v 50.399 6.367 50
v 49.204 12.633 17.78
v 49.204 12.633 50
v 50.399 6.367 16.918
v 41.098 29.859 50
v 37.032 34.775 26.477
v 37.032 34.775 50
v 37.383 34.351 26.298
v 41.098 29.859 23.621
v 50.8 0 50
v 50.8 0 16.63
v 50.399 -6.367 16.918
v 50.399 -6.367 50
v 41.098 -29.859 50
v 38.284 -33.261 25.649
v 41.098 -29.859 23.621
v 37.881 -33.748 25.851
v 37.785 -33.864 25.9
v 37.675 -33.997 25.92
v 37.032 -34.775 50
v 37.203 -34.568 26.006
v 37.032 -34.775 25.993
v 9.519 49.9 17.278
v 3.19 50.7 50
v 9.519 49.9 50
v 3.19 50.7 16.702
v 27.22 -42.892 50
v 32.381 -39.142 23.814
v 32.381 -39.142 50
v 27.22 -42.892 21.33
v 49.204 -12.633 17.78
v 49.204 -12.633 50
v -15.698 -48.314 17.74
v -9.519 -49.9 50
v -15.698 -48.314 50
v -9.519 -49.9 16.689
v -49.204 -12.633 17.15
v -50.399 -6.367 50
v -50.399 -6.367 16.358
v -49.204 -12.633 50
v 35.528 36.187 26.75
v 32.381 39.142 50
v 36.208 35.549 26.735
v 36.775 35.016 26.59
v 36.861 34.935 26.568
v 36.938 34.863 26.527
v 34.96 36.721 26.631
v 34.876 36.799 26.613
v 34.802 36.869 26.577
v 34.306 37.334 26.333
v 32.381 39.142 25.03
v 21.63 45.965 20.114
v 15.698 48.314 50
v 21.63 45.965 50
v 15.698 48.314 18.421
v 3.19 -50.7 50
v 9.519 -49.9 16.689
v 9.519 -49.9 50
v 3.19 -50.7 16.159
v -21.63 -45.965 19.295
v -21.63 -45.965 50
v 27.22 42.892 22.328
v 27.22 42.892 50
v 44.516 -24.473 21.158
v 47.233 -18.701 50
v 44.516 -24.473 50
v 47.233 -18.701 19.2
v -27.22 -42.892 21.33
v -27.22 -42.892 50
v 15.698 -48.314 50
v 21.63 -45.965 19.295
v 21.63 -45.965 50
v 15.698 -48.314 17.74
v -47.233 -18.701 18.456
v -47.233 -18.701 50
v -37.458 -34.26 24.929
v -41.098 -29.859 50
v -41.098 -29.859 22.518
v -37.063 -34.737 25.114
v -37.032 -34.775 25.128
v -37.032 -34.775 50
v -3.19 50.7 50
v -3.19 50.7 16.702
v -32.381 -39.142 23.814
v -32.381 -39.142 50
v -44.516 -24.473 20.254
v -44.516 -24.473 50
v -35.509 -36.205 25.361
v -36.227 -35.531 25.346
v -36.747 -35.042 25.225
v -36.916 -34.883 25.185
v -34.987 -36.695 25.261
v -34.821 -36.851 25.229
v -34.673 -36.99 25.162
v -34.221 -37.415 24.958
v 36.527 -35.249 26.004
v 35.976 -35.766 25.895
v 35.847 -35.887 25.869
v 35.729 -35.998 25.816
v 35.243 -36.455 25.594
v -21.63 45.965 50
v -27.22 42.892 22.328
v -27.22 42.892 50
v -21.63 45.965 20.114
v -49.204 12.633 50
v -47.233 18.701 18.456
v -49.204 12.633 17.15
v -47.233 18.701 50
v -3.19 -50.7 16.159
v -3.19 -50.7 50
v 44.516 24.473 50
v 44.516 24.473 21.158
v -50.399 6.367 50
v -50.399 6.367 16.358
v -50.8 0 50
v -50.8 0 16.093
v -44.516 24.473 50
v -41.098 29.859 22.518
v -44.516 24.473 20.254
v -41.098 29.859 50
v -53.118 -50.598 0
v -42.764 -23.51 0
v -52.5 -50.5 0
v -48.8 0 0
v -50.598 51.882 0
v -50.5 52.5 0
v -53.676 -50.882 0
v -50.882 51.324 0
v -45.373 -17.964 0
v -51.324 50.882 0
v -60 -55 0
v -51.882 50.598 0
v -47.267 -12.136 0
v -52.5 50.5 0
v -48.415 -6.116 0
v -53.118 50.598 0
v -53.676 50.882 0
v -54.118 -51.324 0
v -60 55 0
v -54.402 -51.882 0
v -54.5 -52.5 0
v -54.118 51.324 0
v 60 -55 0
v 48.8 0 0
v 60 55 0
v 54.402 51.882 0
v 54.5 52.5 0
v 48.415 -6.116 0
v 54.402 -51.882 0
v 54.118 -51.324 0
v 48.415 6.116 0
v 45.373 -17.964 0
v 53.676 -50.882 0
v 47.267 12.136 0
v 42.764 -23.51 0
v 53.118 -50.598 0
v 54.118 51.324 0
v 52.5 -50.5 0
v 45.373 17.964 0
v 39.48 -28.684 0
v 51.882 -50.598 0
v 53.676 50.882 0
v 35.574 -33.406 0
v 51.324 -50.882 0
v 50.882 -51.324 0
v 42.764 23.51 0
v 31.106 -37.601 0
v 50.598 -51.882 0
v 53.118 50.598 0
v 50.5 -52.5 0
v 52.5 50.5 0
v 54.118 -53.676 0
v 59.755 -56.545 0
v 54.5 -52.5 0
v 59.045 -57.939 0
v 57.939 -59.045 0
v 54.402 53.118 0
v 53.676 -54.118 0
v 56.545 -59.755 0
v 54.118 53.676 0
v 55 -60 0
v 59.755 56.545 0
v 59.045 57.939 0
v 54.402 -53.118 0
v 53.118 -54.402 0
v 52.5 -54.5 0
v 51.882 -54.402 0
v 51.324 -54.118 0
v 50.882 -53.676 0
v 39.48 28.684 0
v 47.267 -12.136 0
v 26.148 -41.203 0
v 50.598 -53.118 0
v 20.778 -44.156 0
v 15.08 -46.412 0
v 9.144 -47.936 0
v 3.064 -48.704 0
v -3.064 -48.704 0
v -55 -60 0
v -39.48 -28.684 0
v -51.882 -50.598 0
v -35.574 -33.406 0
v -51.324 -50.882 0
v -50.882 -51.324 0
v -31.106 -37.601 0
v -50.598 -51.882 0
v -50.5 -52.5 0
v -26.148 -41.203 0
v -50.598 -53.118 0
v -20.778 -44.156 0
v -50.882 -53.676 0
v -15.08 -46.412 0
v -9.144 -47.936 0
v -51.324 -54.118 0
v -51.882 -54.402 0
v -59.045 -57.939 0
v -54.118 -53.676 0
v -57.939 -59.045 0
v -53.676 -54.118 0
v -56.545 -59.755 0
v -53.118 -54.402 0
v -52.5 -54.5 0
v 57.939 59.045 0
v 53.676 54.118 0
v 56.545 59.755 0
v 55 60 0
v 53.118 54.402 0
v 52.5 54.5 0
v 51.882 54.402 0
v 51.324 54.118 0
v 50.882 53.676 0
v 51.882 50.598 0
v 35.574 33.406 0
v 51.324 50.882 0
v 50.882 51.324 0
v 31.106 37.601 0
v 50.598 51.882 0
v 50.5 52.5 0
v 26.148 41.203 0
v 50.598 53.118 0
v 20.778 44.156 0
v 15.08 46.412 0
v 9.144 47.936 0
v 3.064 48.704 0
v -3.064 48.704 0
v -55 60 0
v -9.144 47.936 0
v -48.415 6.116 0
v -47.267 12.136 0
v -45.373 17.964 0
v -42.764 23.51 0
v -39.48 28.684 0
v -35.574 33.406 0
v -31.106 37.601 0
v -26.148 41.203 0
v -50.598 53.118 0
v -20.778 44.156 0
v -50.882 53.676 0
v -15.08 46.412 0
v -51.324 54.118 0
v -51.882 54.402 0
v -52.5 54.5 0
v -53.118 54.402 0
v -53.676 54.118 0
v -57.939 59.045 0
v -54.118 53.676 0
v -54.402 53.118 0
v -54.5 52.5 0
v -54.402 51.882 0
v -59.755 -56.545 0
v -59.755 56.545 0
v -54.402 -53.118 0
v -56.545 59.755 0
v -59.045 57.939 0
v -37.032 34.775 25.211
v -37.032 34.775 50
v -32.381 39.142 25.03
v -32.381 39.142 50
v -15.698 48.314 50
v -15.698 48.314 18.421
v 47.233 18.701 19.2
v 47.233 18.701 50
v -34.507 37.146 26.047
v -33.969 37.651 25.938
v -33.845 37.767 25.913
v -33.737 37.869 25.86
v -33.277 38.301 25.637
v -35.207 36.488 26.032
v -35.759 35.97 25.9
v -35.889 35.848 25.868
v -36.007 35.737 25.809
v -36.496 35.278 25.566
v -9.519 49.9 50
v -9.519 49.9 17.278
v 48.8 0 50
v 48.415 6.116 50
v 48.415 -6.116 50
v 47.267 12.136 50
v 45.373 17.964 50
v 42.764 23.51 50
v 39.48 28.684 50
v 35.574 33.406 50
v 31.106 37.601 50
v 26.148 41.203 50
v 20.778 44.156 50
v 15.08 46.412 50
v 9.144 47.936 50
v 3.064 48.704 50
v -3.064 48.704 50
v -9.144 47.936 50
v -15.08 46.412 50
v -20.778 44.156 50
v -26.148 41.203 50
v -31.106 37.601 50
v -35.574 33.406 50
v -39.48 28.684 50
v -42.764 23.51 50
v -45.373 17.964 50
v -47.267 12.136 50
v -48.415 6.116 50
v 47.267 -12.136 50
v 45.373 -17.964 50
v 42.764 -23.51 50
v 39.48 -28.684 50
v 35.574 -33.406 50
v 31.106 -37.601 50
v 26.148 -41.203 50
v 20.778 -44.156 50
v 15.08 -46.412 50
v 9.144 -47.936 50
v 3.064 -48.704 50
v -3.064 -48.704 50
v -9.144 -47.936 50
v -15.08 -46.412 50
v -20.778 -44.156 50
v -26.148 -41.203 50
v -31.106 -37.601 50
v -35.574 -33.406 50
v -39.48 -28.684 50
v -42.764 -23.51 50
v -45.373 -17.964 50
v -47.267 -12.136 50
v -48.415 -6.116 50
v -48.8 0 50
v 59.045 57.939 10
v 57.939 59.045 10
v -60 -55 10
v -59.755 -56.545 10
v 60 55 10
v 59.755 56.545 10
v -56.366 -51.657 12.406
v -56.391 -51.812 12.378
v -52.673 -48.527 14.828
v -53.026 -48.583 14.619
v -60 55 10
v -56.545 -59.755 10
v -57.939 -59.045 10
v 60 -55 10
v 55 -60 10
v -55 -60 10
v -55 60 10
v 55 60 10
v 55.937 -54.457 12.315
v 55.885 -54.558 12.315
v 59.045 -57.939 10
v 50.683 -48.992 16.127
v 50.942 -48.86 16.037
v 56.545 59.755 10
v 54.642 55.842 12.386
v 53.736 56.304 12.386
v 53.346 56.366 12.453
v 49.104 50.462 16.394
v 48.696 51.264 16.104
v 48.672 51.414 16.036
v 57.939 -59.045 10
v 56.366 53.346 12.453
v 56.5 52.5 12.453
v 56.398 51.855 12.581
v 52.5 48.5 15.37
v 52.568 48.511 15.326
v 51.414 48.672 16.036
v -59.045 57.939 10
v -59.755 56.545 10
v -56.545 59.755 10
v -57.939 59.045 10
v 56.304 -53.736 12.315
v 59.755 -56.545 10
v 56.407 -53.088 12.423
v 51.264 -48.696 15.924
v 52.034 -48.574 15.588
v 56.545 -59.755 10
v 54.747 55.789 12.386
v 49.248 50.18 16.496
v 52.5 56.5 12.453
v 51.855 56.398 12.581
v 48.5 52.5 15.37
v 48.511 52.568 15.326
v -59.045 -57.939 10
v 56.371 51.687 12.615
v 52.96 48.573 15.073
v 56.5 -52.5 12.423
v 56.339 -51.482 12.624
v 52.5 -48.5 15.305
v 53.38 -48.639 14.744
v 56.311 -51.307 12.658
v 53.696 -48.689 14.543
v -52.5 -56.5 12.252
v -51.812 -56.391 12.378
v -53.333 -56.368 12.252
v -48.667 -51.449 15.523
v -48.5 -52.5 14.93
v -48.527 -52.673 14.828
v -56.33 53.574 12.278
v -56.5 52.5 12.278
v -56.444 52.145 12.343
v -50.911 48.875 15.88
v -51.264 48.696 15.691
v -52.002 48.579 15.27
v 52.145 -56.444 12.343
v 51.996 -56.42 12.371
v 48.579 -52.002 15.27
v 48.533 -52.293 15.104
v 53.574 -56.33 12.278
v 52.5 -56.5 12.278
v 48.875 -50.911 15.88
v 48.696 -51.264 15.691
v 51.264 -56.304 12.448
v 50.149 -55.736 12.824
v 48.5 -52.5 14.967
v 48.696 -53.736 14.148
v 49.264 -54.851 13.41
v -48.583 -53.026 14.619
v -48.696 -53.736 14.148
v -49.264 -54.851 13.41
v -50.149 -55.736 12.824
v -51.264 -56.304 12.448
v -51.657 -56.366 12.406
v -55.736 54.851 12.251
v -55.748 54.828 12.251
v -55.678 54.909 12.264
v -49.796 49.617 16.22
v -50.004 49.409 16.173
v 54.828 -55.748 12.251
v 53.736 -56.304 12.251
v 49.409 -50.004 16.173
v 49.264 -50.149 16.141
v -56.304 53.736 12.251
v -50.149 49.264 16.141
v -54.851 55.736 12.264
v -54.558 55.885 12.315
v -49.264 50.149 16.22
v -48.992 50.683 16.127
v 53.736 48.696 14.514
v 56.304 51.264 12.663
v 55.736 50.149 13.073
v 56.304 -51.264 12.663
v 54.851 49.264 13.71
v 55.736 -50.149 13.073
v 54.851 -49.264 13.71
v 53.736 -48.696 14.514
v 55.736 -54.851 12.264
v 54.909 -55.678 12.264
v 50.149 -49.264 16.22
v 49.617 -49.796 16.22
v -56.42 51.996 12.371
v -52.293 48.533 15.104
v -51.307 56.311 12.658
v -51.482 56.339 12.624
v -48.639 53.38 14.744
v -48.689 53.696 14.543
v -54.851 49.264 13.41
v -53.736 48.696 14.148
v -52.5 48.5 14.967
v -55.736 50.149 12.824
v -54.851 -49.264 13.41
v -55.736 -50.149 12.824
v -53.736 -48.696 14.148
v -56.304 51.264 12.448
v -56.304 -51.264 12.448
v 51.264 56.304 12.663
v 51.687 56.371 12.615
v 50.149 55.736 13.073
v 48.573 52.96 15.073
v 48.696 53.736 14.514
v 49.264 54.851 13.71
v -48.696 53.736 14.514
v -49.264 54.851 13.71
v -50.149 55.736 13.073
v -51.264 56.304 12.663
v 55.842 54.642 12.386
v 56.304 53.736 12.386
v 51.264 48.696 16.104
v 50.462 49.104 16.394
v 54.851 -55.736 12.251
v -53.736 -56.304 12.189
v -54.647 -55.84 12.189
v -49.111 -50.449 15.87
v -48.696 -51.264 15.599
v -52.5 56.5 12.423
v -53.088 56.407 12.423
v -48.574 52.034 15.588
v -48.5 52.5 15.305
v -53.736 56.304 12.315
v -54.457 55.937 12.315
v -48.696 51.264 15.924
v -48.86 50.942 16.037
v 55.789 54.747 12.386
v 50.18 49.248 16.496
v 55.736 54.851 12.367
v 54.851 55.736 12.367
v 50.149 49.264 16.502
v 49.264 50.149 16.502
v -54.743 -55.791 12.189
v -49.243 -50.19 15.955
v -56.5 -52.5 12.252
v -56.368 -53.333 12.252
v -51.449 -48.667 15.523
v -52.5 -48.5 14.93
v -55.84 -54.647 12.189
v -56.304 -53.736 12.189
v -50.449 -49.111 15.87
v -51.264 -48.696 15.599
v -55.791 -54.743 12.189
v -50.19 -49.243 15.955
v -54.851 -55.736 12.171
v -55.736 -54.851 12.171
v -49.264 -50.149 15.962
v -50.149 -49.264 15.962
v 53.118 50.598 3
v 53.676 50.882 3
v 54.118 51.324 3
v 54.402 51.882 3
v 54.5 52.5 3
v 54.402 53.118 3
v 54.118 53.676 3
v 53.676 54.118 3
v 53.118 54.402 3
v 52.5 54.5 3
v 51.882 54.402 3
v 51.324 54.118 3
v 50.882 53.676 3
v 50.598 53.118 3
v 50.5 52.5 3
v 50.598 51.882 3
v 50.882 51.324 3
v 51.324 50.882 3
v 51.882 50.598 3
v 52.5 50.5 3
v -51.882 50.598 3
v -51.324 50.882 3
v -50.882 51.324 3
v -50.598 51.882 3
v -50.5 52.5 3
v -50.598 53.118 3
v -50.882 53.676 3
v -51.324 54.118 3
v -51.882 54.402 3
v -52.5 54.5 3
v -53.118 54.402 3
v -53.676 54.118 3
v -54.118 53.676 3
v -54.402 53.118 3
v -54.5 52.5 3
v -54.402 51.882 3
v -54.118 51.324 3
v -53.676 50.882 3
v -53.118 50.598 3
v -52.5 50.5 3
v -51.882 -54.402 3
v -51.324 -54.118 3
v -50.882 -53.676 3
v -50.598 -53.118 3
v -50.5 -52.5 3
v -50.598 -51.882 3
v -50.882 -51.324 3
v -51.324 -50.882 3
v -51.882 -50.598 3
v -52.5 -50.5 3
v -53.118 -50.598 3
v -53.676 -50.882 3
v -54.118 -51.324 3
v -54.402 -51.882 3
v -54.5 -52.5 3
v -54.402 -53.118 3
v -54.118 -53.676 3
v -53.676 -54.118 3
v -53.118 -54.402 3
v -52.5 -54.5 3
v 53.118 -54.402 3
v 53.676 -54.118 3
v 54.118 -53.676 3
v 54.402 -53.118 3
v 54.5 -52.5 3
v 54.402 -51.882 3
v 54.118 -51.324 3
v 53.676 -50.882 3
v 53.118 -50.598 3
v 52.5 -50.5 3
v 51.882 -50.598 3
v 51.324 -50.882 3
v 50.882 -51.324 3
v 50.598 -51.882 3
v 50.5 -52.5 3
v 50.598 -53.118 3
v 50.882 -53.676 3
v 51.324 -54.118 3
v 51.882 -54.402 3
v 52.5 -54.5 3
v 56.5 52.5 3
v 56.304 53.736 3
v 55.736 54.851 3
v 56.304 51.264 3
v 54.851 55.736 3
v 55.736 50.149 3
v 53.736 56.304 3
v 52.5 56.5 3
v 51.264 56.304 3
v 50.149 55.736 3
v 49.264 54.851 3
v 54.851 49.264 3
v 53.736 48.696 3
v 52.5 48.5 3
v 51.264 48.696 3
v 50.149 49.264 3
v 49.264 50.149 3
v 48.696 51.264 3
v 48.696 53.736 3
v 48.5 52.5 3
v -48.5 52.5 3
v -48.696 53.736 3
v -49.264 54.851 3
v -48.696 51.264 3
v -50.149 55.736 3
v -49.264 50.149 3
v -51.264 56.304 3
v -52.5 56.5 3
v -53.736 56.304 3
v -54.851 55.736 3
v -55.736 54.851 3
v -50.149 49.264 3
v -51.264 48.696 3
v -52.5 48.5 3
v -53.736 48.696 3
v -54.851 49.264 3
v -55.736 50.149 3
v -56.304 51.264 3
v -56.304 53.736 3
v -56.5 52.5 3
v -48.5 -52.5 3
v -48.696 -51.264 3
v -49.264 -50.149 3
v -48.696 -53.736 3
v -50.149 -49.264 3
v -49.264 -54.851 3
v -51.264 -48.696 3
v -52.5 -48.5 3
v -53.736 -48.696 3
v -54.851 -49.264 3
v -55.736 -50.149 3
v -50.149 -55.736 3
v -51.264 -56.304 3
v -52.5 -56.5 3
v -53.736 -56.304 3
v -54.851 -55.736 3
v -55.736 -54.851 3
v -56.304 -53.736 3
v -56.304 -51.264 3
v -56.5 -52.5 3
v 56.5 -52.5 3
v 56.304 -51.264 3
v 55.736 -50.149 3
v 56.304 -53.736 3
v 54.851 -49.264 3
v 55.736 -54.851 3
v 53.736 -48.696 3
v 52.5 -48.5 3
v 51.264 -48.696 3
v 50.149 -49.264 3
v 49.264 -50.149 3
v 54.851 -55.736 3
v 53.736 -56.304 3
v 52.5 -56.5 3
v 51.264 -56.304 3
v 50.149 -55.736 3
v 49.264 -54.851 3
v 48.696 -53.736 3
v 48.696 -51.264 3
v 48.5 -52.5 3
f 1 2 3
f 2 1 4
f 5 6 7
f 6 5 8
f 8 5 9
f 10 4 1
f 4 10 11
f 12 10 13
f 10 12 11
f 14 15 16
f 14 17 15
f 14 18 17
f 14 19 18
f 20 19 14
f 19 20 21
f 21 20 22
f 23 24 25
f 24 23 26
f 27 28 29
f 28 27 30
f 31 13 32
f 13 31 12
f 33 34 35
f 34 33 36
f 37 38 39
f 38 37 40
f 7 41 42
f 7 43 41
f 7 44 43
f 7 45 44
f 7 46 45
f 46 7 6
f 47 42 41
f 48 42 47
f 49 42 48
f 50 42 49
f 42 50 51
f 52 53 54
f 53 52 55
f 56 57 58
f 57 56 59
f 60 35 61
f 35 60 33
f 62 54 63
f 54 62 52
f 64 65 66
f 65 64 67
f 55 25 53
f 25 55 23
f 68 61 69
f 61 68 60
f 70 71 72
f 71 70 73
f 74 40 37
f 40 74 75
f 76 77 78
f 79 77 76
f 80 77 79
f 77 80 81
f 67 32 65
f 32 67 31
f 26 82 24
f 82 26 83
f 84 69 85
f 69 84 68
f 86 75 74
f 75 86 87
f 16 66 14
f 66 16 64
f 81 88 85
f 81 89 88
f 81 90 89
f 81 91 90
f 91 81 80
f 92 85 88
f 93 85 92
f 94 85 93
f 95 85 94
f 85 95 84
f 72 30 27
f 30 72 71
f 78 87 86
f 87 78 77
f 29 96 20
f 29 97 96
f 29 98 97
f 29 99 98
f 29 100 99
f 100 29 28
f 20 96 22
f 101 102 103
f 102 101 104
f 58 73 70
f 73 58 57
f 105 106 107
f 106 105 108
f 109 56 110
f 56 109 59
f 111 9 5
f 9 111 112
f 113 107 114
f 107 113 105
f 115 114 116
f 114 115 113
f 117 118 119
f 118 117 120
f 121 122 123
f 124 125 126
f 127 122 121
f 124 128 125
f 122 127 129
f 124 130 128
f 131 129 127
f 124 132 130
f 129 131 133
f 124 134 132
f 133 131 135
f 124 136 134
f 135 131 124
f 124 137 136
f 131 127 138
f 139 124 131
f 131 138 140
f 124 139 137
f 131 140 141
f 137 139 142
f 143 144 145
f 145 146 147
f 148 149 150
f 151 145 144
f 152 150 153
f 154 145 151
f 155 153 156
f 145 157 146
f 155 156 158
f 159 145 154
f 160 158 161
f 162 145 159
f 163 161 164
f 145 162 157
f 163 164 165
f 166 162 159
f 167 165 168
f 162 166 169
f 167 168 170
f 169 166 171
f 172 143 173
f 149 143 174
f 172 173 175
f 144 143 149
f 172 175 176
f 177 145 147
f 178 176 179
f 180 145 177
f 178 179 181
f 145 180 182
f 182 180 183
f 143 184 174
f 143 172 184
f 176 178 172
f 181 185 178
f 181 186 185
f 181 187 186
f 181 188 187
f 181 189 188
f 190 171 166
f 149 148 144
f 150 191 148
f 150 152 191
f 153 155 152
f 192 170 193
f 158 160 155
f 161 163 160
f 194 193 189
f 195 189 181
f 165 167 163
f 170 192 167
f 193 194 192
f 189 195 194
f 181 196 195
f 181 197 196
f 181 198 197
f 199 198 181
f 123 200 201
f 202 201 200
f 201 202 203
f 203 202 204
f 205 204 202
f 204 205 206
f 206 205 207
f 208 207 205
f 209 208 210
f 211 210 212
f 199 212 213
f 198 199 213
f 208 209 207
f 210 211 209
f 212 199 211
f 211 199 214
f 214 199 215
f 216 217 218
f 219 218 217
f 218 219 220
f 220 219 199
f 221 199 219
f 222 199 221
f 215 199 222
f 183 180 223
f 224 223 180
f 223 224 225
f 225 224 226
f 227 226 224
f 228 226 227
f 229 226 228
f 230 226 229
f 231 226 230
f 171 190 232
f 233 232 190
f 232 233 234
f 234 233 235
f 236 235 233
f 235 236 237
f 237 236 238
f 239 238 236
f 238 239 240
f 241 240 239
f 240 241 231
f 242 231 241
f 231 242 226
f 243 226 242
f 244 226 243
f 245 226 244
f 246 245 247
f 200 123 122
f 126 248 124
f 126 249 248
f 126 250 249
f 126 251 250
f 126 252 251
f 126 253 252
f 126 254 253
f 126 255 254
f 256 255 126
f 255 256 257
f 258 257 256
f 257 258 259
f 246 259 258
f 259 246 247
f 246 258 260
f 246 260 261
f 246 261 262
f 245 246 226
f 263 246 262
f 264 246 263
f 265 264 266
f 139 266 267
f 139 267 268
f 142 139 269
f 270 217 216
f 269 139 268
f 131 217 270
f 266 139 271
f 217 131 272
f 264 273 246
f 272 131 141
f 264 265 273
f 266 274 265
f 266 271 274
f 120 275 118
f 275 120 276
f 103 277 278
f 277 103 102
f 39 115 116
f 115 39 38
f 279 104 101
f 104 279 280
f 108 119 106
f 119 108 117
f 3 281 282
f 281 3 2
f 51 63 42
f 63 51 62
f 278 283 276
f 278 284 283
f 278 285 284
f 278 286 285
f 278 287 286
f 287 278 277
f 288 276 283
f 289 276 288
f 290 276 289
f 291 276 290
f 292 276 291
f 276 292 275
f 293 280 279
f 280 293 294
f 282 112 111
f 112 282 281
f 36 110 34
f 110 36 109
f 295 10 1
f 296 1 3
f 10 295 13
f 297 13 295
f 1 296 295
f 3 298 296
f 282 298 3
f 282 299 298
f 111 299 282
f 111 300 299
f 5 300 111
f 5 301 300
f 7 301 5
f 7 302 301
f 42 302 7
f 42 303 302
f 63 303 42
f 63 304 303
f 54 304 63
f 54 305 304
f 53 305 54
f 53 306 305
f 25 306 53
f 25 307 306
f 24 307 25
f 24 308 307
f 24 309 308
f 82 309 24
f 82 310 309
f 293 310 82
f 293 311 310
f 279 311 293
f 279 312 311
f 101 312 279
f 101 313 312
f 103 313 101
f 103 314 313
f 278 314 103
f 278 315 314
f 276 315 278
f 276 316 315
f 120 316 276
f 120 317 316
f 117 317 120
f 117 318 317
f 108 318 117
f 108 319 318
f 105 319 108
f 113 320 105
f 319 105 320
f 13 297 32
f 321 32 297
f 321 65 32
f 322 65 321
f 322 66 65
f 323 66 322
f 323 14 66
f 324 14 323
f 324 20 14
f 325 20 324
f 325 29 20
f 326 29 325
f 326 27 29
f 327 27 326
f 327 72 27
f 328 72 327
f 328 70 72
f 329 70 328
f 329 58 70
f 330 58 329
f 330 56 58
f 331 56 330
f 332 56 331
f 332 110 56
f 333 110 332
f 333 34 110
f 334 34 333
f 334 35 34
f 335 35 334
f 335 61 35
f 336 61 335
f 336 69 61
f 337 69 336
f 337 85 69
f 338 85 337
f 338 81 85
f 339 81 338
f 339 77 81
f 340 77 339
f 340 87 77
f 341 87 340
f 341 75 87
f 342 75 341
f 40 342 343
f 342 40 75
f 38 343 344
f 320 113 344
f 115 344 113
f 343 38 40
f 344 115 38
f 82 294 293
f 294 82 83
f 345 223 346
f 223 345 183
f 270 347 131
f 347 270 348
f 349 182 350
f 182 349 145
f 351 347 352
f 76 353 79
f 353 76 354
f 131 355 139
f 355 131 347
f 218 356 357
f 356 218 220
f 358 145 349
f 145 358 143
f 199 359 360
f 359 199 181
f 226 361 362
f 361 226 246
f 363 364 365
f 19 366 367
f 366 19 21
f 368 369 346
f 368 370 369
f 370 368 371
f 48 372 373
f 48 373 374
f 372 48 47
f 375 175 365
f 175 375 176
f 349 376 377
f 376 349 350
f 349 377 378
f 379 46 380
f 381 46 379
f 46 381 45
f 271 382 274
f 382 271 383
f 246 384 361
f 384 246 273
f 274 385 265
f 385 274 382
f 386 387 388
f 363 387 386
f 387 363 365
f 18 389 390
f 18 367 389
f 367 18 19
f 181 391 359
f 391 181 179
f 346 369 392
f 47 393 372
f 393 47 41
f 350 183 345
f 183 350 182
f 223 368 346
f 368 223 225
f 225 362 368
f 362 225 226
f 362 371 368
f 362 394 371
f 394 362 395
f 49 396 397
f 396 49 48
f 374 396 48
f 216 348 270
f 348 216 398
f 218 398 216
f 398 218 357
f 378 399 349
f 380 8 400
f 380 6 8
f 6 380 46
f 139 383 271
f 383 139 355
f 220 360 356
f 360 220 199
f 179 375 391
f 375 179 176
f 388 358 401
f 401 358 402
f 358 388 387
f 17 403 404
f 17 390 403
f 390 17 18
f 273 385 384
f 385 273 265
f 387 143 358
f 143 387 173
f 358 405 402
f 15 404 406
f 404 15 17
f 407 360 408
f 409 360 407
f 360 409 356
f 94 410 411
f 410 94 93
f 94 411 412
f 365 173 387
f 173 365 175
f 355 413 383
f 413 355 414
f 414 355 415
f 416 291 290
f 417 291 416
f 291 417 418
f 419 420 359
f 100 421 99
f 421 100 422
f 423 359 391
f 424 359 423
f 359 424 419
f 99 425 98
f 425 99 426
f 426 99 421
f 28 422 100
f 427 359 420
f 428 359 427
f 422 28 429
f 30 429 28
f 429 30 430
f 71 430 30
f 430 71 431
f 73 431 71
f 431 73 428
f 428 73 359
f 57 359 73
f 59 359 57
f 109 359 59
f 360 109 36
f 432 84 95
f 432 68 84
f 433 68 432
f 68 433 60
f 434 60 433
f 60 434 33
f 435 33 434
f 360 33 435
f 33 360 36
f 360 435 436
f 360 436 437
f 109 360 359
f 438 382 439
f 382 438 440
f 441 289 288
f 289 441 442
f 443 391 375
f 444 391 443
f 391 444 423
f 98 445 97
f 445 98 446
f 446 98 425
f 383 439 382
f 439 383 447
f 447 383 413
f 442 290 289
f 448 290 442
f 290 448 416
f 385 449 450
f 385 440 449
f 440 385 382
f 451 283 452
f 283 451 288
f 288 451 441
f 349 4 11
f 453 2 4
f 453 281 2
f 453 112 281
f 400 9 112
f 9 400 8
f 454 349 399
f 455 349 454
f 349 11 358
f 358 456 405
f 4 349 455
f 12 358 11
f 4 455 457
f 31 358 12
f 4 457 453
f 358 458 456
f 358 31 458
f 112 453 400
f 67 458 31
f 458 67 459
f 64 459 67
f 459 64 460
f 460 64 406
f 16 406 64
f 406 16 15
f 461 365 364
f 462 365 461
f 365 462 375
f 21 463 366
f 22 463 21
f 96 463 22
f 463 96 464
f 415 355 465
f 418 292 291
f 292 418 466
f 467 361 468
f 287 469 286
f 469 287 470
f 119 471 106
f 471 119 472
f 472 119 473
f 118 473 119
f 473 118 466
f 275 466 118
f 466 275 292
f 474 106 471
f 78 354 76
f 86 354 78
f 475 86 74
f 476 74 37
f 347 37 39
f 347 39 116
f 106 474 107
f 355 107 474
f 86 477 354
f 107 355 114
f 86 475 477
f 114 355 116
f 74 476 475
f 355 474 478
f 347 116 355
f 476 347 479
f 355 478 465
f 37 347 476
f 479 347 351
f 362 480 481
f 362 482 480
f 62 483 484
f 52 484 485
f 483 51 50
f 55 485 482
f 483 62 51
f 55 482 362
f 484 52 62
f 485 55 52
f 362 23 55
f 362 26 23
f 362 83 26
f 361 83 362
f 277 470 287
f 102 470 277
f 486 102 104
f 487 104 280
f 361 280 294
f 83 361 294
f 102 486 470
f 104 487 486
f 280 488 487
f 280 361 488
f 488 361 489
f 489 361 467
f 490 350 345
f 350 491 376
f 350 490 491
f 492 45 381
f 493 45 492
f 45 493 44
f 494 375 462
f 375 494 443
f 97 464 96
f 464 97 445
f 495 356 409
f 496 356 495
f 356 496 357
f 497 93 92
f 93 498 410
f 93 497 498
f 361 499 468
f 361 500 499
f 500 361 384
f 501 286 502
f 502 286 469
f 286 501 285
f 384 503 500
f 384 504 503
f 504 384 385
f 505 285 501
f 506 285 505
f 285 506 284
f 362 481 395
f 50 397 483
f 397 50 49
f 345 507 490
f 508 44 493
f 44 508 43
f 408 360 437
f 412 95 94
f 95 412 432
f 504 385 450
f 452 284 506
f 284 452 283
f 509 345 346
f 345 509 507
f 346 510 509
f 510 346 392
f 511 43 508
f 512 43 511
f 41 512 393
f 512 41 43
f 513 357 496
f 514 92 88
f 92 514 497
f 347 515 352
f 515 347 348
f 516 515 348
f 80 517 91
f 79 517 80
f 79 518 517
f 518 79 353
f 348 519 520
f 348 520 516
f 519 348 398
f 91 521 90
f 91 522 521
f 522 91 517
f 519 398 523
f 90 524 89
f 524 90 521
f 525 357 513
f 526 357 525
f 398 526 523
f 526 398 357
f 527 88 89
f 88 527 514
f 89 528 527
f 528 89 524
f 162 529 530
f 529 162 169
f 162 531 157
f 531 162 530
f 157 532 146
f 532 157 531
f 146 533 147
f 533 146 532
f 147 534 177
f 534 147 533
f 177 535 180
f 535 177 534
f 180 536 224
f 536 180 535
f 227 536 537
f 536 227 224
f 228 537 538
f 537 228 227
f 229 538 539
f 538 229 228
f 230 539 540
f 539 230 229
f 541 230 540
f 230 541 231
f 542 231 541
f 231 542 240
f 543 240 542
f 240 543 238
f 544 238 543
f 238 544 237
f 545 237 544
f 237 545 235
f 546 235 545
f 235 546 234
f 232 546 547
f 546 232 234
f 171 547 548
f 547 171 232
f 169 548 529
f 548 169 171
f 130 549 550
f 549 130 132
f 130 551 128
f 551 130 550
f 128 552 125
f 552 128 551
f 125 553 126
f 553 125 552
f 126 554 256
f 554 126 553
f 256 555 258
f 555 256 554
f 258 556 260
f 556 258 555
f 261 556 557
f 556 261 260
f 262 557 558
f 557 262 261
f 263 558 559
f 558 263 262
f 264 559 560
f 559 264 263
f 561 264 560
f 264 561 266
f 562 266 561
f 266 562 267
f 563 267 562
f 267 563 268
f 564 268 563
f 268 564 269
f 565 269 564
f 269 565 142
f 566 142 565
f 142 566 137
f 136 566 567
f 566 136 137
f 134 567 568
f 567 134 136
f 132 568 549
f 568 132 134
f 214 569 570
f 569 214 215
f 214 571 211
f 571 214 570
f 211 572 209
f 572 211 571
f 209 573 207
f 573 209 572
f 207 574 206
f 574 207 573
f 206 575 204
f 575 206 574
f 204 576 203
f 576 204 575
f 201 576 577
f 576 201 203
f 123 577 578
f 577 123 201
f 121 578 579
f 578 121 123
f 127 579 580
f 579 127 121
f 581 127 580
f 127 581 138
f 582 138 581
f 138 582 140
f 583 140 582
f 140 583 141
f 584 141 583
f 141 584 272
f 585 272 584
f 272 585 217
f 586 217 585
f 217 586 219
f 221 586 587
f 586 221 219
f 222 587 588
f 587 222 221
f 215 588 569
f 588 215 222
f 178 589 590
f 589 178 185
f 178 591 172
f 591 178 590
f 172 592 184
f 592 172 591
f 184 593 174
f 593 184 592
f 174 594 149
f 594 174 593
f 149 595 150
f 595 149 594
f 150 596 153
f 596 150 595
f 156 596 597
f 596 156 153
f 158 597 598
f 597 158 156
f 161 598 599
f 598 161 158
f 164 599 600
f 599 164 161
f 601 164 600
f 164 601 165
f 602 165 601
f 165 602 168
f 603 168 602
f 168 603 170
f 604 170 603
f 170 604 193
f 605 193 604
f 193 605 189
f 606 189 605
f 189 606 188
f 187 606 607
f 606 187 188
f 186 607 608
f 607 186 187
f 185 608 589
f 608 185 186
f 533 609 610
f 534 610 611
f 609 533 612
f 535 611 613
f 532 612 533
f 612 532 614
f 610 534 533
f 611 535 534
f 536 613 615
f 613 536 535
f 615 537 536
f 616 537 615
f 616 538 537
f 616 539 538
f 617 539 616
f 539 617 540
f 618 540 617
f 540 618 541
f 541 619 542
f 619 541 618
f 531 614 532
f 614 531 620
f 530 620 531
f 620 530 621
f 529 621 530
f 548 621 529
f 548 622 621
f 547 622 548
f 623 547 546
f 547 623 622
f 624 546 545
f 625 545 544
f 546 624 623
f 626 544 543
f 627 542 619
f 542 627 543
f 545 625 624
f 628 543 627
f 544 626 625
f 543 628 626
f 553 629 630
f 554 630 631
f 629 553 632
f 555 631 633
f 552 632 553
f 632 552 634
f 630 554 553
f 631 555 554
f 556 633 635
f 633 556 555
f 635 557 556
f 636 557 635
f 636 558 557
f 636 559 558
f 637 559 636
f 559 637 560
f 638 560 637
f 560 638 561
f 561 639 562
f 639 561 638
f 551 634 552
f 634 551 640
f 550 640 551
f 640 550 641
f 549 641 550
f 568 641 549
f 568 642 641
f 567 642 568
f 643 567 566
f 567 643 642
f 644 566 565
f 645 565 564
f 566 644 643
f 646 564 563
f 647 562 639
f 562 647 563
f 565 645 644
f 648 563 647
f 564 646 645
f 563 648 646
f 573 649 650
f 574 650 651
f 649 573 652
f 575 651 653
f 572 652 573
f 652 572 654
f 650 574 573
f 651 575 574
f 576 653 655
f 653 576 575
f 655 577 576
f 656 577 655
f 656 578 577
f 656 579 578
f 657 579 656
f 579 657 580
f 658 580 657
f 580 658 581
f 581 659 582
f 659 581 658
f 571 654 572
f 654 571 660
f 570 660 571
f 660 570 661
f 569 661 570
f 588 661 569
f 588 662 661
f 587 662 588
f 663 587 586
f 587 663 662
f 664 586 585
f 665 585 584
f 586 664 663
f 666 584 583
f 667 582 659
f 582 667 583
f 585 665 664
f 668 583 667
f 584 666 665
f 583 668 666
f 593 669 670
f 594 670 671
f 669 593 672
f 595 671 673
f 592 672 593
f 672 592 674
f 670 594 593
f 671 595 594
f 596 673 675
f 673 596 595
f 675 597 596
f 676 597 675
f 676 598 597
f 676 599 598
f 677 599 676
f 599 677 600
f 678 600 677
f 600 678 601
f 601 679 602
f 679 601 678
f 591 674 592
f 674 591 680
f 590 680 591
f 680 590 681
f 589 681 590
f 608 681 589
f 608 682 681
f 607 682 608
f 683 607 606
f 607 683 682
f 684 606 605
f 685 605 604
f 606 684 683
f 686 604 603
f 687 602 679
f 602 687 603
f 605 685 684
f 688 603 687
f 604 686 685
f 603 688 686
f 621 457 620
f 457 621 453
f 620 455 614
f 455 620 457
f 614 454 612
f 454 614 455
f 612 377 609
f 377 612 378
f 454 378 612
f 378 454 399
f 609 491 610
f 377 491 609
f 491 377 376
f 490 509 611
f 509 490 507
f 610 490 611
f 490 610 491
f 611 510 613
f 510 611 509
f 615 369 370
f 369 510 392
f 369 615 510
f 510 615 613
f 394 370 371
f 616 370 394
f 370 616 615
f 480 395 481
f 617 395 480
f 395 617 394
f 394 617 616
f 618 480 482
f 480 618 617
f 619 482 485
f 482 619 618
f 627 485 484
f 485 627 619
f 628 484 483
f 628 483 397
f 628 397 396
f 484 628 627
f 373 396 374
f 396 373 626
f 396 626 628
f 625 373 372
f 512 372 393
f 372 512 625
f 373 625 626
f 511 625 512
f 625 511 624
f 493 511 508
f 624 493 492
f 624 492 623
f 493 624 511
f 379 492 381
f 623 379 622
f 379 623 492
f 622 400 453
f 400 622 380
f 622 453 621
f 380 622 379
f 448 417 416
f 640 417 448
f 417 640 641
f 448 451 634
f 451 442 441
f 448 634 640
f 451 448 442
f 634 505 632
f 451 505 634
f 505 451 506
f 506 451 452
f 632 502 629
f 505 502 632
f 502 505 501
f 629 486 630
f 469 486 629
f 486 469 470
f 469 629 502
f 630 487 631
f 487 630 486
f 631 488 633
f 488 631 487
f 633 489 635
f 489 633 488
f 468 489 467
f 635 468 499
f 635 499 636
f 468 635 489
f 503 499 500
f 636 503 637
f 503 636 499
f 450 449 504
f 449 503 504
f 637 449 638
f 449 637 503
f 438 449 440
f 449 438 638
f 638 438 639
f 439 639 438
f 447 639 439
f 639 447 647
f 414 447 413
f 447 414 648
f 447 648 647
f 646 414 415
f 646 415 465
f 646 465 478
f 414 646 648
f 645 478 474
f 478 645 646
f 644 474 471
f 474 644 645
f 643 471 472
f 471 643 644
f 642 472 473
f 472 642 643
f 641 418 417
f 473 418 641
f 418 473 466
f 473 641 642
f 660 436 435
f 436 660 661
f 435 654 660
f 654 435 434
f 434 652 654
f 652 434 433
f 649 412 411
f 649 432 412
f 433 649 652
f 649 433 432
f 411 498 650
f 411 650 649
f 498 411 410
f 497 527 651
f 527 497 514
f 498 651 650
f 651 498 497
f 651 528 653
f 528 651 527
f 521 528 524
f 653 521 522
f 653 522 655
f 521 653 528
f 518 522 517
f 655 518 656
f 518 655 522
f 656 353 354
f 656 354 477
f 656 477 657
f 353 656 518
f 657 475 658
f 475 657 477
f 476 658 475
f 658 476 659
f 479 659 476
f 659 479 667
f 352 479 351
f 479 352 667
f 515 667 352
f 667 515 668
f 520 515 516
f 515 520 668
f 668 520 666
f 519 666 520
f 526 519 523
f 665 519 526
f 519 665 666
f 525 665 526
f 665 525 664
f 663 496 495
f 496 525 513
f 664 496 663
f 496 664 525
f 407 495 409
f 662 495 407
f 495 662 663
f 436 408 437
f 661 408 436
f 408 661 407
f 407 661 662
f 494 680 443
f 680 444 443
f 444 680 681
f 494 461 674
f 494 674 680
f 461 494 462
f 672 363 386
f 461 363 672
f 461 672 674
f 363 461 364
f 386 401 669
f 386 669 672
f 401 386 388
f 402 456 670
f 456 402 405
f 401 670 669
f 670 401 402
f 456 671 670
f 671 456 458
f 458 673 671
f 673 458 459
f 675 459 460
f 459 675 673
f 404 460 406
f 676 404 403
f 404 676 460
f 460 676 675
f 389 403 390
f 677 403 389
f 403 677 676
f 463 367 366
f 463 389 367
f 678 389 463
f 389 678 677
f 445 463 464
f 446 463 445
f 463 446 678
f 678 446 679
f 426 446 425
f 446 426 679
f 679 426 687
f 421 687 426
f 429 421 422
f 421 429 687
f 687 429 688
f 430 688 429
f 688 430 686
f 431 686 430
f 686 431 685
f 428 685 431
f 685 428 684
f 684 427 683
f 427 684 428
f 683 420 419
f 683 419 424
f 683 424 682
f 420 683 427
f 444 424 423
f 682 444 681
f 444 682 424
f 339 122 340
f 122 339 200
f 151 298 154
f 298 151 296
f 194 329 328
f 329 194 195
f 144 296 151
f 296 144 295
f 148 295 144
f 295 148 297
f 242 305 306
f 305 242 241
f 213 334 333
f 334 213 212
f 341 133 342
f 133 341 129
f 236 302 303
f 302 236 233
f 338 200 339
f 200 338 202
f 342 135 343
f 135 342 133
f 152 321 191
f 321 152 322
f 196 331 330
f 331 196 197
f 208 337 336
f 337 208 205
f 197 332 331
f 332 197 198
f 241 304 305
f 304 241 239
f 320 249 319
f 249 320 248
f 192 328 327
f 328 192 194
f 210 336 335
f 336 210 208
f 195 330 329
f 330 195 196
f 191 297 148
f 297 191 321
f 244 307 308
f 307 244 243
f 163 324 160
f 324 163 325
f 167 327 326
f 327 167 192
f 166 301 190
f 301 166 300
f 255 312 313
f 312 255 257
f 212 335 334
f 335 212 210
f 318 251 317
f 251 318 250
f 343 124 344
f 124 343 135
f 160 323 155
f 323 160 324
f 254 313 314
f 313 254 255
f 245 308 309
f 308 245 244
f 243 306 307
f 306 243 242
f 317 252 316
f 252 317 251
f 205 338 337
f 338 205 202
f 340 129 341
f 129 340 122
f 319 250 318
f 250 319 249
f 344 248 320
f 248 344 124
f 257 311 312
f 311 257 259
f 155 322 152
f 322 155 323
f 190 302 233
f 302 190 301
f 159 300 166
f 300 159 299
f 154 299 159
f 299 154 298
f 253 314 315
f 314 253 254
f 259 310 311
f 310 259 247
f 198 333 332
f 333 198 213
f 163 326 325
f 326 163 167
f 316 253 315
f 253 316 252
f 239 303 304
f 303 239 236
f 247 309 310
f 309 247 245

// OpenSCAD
// file: ../lib/utils.scad
include <params.scad>;

function tol(val) = val - tolerance;

module cone(r, angle, invert=false) {
    h = tan((180 - angle) / 2) * r;
    translate([0, 0, -h]) {
        if (invert) {
                cylinder(r1=r,r2=0,h=h, $fn=20); 
        } else {
            cylinder(r1=0,r2=r,h=h, $fn=20); 
        }
    }
}

module roundrect(vect, r, $fn=20) {
    sq = len(vect) > 1
        ? [for (i = [0:1:len(vect)-1]) vect[i] - r * 2]
        : vect - r * 2;
    minkowski() {
        square(sq);
        translate([r, r])
            circle(r=r);
    }
}

module profile($fn=20) {
    minkowski() {
        translate([fan_case_radius, fan_case_radius, 0])
            square(fan_case - fan_case_radius * 2);
        circle(fan_case_radius, $fn);
    }
}

module fan_mount_points(radius, $fn=20) {
    offset = (fan_case - fan_screw_distance) / 2;
    translate([offset, offset, 0]) {
        circle(radius, $fn);
        translate([fan_screw_distance, 0, 0])
            circle(radius, $fn);
        translate([fan_screw_distance, fan_screw_distance, 0])
            circle(radius, $fn);
        translate([0, fan_screw_distance, 0])
            circle(radius, $fn);
    }
}

module square_grill(width, height, fin_width, fin_count) {
    fin_spacing = width / fin_count;
    difference() {
        square(width);
        union() {
            for (i = [0:1:fin_count]) {
                translate([(i + 1) * fin_spacing - (fin_spacing / 2) - (fin_width / 2), 0, 0])
                    square([fin_width, height]);
            }
        }
    }
}

module bushing(outer_r, inner_r, h) {
    linear_extrude(h)
        difference() {
            circle(r=outer_r);
            circle(r=inner_r);
        }
}

module screw_at_origin(r, d, l, head, head_d, cap, angle) {
    translate([0, 0, -l])
        screw(r, d, l, head, head_d, cap, angle);
}

module screw(r, d, l, head, head_d, cap, angle, fn=20, head_fn) {
    radius = r > 0 ? r : d / 2;
    head_r = head > 0 ? head : head_d / 2;
    hfn = head_fn ? head_fn : fn;

    union() {
        if (angle) {
            translate([0, 0, l])
                cone(head_r, angle, false);
        }
        linear_extrude(l)
            circle(r=radius, $fn=fn);
        if (cap > 0) {
            translate([0, 0, l - cap])
                linear_extrude(cap)
                    circle(r=head_r, $fn=hfn);
        }
    }
}

module inset_screw(r, d, l, head, head_d, cap, angle, inset, fn=20, head_fn) {
    screw_height = l - inset;
    head_r = head > 0 ? head : head_d / 2;

    union() {
        screw(
            r=r,
            d=d,
            l=screw_height,
            head=head_r,
            cap=cap,
            angle=angle,
            fn=fn,
            head_fn=head_fn
        );
        translate([0, 0, screw_height])
            linear_extrude(inset)
                circle(r=head_r, $fn=fn);
    }
}

function inch_to_mm(inches) = inches * 25.4;
// file: ../lib/params.scad
fan_case = 120;
fan_screw_distance = 105;
fan_case_depth = 25;
fan_case_radius = 5;
fan_case_screw_radius = 2.5;
fan_case_socket_cap_radius = 5.6 / 2;
fan_case_screw_head_radius = 3;
fan_case_screw_head_angle = 90;

grill_screw_size = 3;
grill_screw_radius = grill_screw_size / 2;
grill_screw_inset = 2;
grill_radius = 114 / 2;
grill_fin_offset = 10;
grill_fin_thickness = 2;
grill_fin_degrees = 30;

rear_grill_thickness = 2;

front_grill_thickness = 2;
front_grill_fin_count = 6;
front_grill_fin_thickness = 2;

filter_thickness = 5;
filter_width = fan_screw_distance - fan_case_screw_radius * 3;
filter_offset = (fan_case - filter_width) / 2;

base_retainer_thickness = 2;
base_height = 30;
base_cut_offset = 10;
base_retainer_inset = 4;

adapter_thickness = 2;
adapter_duct_in = 4;
adapter_height = 14;
adapter_duct_height = 50;
flat_adapter_duct_height = 50;
flat_adapter_screw_radius = 2;
flat_adapter_screw_head_radius = 4;

caddy_thickness = 2;
caddy_handle_width = 20;
caddy_handle_depth = 10;
caddy_handle_grip_count = 5;
caddy_handle_grip_depth = 1;
caddy_handle_grip_width = 1;
caddy_clip_height = 2;
caddy_clip_depth = 6;
caddy_clip_offset = 1;

foot_lower_radius = 15;
foot_upper_radius = 20;
foot_height = 18;
foot_inset_radius = 4;
foot_inset_depth = 3;
foot_screw_radius = 4;
foot_screw_inset = 6;
foot_screw_head_radius = 8;

power_supply_case_thickness = 3.0;
power_supply_screw_radius = 1.5;
power_supply_bushing_radius = 7.5;

power_supply_cable_pass_width = 18;
power_supply_cable_pass_height = 5;
power_supply_cable_pass_overhang = 5;
power_supply_cable_pass_overhang_depth = power_supply_case_thickness;
power_supply_cable_pass_depth = 3;
power_supply_cable_pass_thickness = 3;

tolerance = 0.2;
// main file
include <../lib/params.scad>;
use <../lib/utils.scad>;

duct_mm_diameter = inch_to_mm(adapter_duct_in);
upper_adapter_size = (duct_mm_diameter / sqrt(2)) - adapter_thickness * 2;
$fn=50;

module cone_partial(offset_amount=0) {
    upper = (fan_case + adapter_thickness + tolerance - upper_adapter_size) / 2;
    hull() {
        translate([upper, upper, adapter_height])
            linear_extrude(height=adapter_height)
                offset(r=offset_amount)
                    resize([upper_adapter_size, upper_adapter_size])
                        roundrect([fan_case, fan_case], r=fan_case_radius);
        translate([0, 0, 0])
            linear_extrude(height=10)
                offset(r=offset_amount)
                    roundrect([fan_case, fan_case], r=fan_case_radius);
    }
}

difference() {
    union() {
        linear_extrude(height=flat_adapter_duct_height)
            circle(d=duct_mm_diameter);
        translate([-fan_case/2, -fan_case/2, 0])
            cone_partial();
    }
    linear_extrude(height=flat_adapter_duct_height)
        circle(d=duct_mm_diameter-adapter_thickness*2);
    translate([-fan_case/2, -fan_case/2, 0])
        union() {
            linear_extrude(height=50)
                fan_mount_points(radius=flat_adapter_screw_radius);
            translate([0, 0, 3]) {
                linear_extrude(height=50)
                    fan_mount_points(radius=flat_adapter_screw_head_radius);
            }
        }
}
